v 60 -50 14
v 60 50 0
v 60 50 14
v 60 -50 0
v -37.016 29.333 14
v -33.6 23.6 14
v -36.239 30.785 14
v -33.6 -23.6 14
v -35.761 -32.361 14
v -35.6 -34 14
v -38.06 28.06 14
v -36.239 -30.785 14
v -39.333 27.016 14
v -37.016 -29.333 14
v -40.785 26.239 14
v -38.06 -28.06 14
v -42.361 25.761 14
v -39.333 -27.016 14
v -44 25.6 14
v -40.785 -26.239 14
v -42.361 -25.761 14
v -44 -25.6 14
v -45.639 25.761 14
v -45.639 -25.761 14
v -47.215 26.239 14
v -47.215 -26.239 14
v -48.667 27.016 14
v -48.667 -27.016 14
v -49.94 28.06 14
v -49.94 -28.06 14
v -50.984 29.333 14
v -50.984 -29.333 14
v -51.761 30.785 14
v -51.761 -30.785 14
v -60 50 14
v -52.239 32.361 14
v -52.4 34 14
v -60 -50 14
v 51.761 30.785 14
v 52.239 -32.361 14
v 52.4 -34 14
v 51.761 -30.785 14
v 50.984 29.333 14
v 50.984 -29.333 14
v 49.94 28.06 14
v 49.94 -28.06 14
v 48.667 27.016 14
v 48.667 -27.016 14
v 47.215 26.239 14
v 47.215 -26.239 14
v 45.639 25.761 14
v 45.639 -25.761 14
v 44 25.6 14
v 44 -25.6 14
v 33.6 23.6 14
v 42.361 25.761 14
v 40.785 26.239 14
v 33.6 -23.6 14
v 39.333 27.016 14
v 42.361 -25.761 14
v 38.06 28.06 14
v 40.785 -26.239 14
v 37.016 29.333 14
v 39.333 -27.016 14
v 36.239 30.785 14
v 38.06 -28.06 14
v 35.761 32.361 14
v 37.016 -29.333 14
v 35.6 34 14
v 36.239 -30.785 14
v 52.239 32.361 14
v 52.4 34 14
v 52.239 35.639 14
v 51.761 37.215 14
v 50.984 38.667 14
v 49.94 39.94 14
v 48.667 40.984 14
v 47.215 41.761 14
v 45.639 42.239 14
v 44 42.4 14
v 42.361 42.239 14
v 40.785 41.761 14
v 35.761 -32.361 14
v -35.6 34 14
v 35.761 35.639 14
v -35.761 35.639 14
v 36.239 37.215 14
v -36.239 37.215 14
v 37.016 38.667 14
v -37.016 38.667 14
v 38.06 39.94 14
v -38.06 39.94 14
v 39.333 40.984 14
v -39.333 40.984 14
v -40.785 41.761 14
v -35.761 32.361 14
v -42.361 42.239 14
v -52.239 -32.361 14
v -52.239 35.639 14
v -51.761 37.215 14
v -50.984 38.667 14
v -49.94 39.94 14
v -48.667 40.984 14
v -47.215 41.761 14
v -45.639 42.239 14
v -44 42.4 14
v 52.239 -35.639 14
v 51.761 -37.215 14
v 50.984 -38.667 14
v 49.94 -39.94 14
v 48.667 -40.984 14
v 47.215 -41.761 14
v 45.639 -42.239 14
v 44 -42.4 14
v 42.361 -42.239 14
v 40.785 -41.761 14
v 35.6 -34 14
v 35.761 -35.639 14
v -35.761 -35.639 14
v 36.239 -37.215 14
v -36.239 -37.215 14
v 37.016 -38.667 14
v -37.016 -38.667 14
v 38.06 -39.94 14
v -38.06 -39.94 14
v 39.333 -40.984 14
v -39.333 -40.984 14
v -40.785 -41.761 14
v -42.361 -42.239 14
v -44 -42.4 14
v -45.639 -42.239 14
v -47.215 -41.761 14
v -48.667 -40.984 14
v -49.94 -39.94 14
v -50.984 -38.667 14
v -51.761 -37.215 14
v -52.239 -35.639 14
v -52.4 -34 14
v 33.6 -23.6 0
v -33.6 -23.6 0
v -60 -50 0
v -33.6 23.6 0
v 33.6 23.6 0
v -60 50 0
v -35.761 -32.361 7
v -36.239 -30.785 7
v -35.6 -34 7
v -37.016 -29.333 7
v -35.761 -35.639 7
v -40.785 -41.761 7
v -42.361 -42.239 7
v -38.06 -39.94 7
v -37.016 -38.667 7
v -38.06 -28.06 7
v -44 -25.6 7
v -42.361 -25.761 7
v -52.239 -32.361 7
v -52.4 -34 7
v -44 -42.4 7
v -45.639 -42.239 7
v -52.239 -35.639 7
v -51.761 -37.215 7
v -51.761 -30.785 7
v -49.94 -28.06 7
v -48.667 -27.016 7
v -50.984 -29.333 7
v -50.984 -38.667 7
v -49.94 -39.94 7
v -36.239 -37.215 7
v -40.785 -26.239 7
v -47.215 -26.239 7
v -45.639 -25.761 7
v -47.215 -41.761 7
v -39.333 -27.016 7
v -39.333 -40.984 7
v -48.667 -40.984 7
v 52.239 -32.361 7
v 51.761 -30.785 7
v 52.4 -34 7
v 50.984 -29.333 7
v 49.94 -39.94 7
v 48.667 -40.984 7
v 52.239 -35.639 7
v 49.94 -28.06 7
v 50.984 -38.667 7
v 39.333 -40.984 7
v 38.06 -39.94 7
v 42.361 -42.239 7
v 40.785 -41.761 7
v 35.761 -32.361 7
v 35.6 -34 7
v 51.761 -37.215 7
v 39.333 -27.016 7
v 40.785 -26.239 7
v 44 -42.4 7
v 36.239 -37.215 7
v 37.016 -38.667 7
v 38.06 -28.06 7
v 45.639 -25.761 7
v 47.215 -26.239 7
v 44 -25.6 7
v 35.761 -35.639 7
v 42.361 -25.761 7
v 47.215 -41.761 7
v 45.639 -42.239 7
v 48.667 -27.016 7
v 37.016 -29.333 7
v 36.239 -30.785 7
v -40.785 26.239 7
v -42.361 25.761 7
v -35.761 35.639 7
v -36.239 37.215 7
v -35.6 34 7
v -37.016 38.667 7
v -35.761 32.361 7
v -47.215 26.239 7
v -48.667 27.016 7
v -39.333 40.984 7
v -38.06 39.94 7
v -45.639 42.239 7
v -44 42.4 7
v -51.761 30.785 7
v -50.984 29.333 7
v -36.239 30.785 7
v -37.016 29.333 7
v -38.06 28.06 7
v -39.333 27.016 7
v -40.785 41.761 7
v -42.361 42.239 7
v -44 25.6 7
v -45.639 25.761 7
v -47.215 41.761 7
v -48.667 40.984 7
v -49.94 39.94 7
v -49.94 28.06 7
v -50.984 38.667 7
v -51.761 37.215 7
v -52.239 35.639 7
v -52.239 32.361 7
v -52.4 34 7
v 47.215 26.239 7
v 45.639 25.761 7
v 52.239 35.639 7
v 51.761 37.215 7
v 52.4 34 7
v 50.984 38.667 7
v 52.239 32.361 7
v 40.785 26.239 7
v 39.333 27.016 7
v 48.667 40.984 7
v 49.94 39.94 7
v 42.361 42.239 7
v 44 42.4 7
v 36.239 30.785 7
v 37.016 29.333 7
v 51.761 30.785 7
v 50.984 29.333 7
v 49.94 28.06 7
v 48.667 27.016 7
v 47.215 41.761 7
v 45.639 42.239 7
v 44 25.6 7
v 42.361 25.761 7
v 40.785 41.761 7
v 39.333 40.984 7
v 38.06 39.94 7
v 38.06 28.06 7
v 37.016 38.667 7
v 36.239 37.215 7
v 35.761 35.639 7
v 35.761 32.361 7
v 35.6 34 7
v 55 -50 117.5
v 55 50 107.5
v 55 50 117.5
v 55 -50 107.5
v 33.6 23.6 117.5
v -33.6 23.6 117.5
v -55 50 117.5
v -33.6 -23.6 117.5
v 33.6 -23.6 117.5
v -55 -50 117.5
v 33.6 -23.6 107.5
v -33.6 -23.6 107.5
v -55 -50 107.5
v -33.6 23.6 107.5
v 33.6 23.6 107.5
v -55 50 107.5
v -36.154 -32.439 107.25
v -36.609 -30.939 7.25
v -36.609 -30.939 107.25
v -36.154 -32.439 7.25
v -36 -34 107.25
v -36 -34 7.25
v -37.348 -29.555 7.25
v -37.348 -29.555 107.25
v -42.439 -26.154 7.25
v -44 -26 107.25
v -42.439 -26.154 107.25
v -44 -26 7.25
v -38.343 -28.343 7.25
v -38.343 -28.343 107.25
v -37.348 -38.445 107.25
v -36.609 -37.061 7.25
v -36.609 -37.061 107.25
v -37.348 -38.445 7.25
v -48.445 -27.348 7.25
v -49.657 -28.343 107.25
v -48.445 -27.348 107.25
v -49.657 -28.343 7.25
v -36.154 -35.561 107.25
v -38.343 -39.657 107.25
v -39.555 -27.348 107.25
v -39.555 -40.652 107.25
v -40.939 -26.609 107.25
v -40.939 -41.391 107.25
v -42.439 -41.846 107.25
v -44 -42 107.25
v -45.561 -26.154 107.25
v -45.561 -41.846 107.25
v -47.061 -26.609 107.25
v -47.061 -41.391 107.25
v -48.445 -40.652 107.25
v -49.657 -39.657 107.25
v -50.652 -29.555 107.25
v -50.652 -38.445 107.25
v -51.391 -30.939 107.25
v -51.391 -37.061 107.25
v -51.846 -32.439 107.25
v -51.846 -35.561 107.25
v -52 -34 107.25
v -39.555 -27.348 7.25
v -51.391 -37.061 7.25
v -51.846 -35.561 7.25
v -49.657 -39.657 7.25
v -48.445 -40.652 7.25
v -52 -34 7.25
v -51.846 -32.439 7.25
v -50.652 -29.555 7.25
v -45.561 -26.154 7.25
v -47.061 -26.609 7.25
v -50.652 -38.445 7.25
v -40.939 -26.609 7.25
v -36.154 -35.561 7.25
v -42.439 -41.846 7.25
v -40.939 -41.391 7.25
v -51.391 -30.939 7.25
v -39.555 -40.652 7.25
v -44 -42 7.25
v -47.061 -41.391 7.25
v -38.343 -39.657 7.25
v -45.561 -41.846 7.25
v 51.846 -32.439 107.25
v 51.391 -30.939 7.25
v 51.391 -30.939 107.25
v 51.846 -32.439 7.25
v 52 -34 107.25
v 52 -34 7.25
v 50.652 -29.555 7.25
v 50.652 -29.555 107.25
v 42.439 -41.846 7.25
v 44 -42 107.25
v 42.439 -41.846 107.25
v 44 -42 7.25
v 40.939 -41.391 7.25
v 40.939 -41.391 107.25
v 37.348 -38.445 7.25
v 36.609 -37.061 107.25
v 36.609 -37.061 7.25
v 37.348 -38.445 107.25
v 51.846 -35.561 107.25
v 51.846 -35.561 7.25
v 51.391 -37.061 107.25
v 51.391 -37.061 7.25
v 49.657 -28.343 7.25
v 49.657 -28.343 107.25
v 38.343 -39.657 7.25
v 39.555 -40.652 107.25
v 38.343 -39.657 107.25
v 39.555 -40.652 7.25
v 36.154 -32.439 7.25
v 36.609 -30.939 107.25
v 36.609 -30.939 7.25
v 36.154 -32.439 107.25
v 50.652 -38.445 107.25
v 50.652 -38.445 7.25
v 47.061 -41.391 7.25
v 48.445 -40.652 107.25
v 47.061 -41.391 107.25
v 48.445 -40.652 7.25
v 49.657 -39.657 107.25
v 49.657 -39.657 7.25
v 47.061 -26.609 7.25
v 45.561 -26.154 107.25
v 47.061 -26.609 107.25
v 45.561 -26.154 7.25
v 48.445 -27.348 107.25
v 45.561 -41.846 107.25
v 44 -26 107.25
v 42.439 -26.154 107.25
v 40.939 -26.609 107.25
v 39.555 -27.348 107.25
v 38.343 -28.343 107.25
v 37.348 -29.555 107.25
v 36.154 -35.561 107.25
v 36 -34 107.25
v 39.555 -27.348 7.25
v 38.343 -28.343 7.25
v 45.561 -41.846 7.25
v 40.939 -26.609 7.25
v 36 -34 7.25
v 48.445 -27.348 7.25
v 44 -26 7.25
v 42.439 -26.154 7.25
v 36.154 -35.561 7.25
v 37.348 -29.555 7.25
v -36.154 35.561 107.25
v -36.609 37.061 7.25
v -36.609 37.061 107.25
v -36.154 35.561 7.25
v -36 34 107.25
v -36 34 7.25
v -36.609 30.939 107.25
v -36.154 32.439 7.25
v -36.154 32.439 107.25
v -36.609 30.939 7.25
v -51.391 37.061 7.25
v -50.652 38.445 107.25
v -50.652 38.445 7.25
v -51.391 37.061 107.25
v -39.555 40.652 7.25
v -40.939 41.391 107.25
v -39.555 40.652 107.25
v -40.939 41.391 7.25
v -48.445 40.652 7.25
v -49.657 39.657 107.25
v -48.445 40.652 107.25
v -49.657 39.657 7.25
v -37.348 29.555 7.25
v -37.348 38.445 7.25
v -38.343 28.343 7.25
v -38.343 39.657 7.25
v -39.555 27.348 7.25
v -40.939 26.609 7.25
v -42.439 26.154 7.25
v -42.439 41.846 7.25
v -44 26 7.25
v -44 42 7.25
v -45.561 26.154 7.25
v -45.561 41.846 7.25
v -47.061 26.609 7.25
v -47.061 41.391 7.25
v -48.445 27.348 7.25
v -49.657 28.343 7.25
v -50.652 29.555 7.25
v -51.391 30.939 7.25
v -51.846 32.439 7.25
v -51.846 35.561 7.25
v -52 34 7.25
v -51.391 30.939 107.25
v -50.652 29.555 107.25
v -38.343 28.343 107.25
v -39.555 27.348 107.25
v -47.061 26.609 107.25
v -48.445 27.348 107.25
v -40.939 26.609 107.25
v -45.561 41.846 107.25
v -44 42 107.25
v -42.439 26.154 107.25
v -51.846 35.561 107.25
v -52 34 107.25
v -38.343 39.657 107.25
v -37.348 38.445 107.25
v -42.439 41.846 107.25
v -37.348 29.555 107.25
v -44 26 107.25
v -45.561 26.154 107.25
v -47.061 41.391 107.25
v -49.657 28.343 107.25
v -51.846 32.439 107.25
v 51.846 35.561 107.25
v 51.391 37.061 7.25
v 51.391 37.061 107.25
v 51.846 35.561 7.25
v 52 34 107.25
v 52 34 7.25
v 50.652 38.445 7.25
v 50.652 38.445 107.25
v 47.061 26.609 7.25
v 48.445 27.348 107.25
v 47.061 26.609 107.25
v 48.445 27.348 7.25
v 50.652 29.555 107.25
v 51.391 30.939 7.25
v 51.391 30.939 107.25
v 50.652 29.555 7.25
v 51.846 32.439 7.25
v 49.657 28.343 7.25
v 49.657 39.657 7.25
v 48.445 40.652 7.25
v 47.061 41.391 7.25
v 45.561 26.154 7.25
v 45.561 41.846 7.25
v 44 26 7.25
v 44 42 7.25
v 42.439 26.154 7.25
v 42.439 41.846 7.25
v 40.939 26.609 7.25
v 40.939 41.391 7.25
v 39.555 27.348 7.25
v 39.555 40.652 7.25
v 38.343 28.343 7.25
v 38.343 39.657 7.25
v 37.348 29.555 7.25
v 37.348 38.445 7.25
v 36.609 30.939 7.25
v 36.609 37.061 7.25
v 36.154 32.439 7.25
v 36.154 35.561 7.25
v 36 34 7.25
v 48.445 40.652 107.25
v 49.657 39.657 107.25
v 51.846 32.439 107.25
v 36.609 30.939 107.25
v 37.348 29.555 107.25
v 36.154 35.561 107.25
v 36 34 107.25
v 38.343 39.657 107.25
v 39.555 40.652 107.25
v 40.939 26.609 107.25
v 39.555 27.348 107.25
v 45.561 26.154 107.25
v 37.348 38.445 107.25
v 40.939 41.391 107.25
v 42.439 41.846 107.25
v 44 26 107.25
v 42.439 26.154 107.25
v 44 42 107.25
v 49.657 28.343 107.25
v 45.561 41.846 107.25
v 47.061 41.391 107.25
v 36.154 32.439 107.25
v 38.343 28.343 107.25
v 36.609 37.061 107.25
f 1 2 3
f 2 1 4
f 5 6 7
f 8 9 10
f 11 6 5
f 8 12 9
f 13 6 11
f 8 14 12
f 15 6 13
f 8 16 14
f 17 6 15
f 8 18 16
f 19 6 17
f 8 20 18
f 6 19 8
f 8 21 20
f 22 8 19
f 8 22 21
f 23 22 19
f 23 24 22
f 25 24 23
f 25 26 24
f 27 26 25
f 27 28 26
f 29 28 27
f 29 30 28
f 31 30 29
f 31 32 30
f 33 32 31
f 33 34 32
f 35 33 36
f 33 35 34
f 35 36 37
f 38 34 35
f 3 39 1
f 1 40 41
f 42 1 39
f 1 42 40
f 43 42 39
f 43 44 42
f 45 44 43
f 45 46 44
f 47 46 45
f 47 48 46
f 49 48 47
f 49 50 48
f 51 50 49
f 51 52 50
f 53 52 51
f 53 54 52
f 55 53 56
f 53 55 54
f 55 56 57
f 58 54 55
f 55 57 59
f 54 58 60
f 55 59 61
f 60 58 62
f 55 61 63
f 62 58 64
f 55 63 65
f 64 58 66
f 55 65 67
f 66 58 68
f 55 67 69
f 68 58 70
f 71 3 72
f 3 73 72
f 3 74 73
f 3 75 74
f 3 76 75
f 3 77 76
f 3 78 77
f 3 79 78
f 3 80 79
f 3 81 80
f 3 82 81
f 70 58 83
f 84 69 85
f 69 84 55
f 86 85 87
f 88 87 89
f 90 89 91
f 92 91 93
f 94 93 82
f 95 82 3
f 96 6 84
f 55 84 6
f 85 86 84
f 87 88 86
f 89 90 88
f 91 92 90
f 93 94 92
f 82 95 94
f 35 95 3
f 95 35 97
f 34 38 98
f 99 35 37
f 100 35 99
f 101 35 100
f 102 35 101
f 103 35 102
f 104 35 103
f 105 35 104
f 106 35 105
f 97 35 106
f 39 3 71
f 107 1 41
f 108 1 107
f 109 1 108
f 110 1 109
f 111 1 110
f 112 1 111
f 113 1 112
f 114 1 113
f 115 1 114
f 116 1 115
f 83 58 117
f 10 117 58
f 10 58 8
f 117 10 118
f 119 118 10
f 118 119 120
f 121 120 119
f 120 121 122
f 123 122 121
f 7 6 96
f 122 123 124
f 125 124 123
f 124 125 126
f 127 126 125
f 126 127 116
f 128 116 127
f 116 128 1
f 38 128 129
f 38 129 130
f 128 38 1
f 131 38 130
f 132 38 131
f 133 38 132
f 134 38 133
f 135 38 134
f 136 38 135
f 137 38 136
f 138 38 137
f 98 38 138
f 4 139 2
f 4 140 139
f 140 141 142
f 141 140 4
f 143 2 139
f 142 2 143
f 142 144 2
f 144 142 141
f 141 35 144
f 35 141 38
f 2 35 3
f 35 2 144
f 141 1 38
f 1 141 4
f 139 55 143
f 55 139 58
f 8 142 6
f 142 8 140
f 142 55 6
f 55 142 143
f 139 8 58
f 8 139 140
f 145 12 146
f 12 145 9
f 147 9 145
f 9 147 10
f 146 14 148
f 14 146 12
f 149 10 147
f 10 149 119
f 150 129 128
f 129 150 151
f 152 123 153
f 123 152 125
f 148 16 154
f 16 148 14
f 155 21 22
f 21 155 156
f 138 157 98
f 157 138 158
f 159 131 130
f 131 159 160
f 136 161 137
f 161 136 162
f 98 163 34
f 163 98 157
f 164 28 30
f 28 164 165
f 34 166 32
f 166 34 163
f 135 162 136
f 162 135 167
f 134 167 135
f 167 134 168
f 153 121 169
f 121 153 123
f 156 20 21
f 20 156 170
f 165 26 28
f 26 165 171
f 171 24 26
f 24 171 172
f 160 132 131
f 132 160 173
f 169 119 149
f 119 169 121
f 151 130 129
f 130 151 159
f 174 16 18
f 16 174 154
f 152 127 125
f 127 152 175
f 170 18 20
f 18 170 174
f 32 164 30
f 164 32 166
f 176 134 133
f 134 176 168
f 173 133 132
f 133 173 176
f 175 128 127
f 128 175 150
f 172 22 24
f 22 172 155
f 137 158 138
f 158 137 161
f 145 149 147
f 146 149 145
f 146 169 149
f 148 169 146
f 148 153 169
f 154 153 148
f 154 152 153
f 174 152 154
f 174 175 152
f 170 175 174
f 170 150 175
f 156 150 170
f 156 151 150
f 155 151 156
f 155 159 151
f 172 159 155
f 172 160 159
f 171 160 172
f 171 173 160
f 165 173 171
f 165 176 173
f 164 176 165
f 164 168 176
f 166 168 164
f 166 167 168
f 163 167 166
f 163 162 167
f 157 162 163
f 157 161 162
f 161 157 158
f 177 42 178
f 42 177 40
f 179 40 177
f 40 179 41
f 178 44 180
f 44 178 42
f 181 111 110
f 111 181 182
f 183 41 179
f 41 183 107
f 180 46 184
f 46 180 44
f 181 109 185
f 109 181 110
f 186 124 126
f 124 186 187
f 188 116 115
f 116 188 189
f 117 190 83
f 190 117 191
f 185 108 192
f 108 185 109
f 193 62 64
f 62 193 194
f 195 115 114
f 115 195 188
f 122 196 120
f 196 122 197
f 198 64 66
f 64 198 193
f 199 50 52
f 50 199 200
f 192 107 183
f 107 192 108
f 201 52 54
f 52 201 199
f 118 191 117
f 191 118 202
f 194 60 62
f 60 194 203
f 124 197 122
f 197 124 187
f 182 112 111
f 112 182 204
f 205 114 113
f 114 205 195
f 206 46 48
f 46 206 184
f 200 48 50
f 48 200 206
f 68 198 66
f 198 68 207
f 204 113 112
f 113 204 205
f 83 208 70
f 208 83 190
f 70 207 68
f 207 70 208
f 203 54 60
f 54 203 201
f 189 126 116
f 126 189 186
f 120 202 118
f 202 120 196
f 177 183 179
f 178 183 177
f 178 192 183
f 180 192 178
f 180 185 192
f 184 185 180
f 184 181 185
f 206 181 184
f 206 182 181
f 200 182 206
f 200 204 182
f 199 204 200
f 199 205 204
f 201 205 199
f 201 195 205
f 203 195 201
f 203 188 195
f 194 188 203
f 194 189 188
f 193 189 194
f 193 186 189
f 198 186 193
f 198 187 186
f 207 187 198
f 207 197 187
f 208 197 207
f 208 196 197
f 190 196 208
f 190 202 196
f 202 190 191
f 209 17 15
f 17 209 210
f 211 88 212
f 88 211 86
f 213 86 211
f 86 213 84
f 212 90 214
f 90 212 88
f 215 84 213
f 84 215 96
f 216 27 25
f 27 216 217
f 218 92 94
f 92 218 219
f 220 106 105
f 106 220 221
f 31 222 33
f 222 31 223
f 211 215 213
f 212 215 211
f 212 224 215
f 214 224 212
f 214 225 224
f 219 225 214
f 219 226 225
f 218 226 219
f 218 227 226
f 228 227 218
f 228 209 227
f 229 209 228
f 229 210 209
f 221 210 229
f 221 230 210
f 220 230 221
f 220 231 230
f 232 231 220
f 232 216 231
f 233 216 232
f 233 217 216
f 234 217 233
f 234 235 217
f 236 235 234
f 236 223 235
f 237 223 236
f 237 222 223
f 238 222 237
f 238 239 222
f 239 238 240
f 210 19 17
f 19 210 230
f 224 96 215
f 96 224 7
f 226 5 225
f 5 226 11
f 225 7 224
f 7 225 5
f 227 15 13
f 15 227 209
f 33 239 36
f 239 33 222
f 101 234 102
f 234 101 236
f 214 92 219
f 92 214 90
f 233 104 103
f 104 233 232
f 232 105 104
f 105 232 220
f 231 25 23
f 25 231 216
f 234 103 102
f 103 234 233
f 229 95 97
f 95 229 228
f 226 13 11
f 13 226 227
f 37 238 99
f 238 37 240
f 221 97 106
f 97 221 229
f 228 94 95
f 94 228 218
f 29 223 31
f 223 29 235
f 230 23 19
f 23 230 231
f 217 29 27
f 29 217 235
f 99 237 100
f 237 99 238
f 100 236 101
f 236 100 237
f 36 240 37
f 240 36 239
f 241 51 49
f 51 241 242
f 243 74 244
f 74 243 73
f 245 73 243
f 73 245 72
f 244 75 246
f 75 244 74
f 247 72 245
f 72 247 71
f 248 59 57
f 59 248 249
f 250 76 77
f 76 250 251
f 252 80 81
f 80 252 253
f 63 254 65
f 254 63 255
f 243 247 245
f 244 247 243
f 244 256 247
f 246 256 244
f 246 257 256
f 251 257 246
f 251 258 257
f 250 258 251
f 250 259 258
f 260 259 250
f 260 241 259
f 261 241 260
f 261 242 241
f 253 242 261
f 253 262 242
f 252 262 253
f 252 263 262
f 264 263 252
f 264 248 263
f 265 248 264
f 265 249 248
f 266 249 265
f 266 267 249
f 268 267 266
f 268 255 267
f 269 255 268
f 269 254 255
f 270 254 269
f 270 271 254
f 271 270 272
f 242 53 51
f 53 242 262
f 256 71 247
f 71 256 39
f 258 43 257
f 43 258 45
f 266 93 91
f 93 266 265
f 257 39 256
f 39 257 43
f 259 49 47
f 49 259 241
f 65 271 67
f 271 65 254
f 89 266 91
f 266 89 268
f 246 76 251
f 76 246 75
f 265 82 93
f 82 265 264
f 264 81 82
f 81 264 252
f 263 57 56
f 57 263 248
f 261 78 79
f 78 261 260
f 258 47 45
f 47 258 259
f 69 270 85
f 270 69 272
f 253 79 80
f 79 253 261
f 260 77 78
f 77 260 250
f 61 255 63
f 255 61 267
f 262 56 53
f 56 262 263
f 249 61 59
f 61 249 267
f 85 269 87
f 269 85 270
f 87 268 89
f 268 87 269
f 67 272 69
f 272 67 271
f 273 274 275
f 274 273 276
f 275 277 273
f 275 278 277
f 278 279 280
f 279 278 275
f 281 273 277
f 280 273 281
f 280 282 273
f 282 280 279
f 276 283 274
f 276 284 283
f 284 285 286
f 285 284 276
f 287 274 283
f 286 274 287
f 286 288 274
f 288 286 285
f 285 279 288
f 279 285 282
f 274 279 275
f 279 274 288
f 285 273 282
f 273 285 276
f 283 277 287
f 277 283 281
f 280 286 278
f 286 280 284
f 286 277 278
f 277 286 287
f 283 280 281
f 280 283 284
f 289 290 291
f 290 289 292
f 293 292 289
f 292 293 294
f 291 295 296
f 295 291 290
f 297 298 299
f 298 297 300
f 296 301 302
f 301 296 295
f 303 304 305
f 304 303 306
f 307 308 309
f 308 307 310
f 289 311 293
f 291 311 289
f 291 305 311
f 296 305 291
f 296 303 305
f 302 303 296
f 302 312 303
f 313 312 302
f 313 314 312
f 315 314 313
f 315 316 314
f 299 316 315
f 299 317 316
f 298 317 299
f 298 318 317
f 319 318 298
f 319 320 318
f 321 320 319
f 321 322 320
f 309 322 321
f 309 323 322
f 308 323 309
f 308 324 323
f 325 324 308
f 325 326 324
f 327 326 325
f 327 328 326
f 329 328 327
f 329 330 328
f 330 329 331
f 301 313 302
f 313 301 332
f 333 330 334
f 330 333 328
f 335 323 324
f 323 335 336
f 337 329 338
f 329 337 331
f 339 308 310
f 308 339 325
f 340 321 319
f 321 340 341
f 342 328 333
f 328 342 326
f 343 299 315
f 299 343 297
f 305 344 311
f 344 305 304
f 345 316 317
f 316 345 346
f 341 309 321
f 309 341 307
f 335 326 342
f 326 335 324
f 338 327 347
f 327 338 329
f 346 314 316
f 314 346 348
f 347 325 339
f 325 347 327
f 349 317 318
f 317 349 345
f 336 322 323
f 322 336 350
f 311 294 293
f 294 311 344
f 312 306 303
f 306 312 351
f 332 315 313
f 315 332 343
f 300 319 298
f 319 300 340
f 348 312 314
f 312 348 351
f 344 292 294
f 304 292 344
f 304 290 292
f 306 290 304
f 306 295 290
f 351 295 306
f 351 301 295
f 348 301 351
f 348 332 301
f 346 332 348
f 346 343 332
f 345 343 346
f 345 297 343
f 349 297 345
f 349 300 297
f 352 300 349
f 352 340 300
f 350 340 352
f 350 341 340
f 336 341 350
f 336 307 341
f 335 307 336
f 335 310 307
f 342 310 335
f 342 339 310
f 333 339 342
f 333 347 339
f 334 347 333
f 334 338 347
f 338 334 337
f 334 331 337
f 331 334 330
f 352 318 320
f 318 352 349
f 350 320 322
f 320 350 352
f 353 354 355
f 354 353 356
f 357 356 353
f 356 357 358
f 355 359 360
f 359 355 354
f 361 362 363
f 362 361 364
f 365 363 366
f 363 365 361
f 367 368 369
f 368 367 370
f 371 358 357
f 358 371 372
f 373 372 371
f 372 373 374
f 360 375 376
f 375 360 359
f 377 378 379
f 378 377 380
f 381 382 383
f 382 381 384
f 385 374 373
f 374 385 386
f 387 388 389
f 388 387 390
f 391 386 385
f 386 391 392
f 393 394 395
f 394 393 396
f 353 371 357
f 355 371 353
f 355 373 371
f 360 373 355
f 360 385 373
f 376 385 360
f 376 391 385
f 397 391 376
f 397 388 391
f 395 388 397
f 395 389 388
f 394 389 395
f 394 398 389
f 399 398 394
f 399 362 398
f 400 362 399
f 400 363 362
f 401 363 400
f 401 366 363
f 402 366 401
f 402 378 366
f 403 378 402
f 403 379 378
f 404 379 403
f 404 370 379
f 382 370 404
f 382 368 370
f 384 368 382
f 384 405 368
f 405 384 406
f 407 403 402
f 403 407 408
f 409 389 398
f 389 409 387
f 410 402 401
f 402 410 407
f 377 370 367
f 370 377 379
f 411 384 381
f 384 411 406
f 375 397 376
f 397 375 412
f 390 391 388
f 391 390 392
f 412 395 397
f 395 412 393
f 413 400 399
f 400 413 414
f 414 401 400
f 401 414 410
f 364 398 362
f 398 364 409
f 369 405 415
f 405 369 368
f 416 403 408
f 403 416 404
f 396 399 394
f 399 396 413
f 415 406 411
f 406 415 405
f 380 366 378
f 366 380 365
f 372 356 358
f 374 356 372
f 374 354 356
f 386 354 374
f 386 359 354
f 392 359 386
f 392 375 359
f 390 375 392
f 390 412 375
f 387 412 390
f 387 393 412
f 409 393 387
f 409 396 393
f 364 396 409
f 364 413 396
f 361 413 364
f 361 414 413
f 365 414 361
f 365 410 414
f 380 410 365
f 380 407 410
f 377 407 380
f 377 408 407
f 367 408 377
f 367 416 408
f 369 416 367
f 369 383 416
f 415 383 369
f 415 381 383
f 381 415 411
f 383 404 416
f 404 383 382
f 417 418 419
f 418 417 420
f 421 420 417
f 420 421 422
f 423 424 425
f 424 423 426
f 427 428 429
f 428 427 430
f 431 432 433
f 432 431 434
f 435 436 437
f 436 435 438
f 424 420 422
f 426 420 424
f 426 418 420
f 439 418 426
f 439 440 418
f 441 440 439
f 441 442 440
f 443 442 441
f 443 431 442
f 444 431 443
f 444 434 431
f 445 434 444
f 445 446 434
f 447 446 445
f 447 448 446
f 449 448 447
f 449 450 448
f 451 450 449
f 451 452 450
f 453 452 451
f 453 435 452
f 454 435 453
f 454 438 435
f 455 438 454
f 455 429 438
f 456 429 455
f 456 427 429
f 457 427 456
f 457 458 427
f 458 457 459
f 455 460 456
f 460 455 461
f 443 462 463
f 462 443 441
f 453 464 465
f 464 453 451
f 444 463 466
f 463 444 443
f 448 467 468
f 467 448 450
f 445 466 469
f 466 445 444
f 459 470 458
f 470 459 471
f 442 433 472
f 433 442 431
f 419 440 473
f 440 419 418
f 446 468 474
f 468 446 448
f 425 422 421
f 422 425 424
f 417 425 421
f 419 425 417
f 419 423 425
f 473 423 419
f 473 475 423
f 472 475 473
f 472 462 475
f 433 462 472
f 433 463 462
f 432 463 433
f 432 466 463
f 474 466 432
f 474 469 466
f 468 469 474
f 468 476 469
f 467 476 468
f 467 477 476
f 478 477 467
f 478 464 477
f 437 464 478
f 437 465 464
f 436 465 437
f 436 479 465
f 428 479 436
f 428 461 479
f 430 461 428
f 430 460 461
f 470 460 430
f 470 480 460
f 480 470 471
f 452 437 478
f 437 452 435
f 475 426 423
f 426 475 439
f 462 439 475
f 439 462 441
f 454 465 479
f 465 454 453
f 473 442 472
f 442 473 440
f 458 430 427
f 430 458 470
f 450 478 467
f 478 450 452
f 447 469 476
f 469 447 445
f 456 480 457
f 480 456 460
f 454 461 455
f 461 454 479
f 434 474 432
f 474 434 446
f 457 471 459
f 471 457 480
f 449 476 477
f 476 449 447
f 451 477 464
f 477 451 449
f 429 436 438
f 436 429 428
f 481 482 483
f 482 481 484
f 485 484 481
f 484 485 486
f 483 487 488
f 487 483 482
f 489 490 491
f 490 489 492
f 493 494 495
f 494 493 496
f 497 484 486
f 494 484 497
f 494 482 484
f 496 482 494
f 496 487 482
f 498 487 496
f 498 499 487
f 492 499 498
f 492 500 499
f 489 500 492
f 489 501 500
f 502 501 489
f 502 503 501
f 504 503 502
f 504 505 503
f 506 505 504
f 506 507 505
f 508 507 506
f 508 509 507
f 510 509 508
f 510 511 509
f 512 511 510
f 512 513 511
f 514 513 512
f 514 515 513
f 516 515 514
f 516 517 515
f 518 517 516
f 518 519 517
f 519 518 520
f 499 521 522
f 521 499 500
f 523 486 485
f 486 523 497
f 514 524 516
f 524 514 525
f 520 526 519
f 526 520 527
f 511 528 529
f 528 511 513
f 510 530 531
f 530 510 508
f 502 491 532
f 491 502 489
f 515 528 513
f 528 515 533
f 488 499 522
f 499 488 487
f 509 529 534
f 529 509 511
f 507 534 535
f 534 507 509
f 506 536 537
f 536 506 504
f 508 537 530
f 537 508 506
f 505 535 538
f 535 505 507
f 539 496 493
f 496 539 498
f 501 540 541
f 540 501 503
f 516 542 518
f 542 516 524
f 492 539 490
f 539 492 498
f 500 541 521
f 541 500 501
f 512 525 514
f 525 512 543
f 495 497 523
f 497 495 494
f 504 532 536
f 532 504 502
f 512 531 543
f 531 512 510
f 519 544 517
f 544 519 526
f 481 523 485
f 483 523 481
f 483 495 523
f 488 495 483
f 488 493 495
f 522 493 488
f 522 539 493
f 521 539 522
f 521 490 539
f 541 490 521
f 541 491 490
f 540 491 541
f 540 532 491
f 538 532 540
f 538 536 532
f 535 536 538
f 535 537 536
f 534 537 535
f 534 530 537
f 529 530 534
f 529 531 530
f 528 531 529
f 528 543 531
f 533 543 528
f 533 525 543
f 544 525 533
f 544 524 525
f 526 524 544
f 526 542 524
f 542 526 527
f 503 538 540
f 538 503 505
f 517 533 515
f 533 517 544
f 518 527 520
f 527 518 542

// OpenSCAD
$fn = 32;

// ------------------------------------------------------------------------
// Frame cube: base 120 x 100 mm, posts 100 mm tall
// Every part is its own module, assembly() places every instance.
// ------------------------------------------------------------------------

// --- part 1 ---
module base_frame() {
  difference() {
    translate([-60, -50, 0]) cube([120, 100, 14]);
    translate([-33.6, -23.6, -1]) cube([67.2, 47.2, 16]);
    translate([-44, -34, 7]) cylinder(h = 8, d = 16.8);
    translate([44, -34, 7]) cylinder(h = 8, d = 16.8);
    translate([-44, 34, 7]) cylinder(h = 8, d = 16.8);
    translate([44, 34, 7]) cylinder(h = 8, d = 16.8);
  }
}

// --- part 2 ---
module corner_post() {
  cylinder(h = 100, d = 16);
}

// --- part 3 ---
module top_frame() {
  difference() {
    translate([-55, -50, 0]) cube([110, 100, 10]);
    translate([-33.6, -23.6, -1]) cube([67.2, 47.2, 12]);
  }
}

// --- assembly ---
module assembly() {
  color([0.80, 0.24, 0.20]) translate([0, 0, 0]) rotate([0, 0, 0]) base_frame();
  color([0.20, 0.45, 0.75]) translate([-44, -34, 7.25]) rotate([0, 0, 0]) corner_post();
  color([0.25, 0.62, 0.32]) translate([44, -34, 7.25]) rotate([0, 0, 0]) corner_post();
  color([0.92, 0.70, 0.18]) translate([-44, 34, 7.25]) rotate([0, 0, 0]) corner_post();
  color([0.58, 0.35, 0.70]) translate([44, 34, 7.25]) rotate([0, 0, 0]) corner_post();
  color([0.16, 0.66, 0.66]) translate([0, 0, 107.5]) rotate([0, 0, 0]) top_frame();
}

assembly();
